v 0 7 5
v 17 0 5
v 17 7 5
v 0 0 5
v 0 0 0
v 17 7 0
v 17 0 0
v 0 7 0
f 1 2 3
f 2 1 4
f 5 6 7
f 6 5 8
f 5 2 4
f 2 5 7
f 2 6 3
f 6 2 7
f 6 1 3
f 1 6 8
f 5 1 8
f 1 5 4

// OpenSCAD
// Generated by SolidPython 1.0.1 on 2020-07-29 00:46:56


cube(size = [17, 7, 5]);
/***********************************************
*********      SolidPython code:      **********
************************************************
 
# import packages: SolidPython
from solid import *
from solid.utils import *
from itertools import chain, combinations, permutations


class Resize:

    def __init__(self, scad_file):
        self.scad_file = scad_file
        #self.scad_file = import_scad(scad_file)
        # cone/cylinder param:
        self.r1 = 0
        self.r2 = 0
        self.h = 0
        # rectangular prism param:
        self.w = 0
        self.l = 0
        # ellipse param:
        self.r = 0

    # import OpenScad code (file name corresponds to shape)


    # classify shape + parameters
    def assign(self, param1, param2, param3):
        if self.scad_file == 'cone.scad':
            self.r1 = param1
            self.r2 = param2
            self.h = param3
        elif self.scad_file == 'cylinder.scad':
            self.r1 = param1
            self.r2 = param2
            self.h = param3
        elif self.scad_file == 'rectangularPrism.scad':
            self.h = param1
            self.l = param2
            self.w = param3
        else:
            self.r = param1
            self.h = param2

    # resize parameters
    def iterate(self):
        x = range(3, 20, 2)
        i = 1
        if self.scad_file == 'cone.scad':
            tempList = list(permutations(x, 2))
            for temp in tempList:
                param1 = temp[0]
                param2 = temp[1]
                filepath = 'produced_scad_files/' + 'cone' + str(param1) + '_' + str(param2) + '_' + '.scad'
                scad_render_to_file(cylinder(h=param1, r1=param2, r2=0), filepath)

        elif self.scad_file == 'cylinder.scad':
            tempList = list(permutations(x, 3))
            for temp in tempList:
                param1 = temp[0]
                param2 = temp[1]
                filepath = 'produced_scad_files/' + 'cylinder' + str(param1) + '_' + str(param2) + '_' + '.scad'
                scad_render_to_file(cylinder(h=param1, r1=param2, r2=param2), filepath)

        elif self.scad_file == 'rectangularPrism.scad':
            tempList = list(permutations(x, 3))
            for temp in tempList:
                param1 = temp[0]
                param2 = temp[1]
                param3 = temp[2]
                filepath = 'produced_scad_files/' + 'rectangularPrism' + str(param1) + '_' + str(param2) + '_' + str(
                    param3) + '.scad'
                scad_render_to_file(cube(size=(param1, param2, param3)), filepath)

        elif self.scad_file == 'ellipse.scad':
            tempList = list(permutations(x, 4))
            for temp in tempList:
                param1 = temp[0]
                param2 = temp[1]
                param3 = temp[2]
                param4 = temp[3]
                filepath = 'produced_scad_files/' + 'ellipse' + str(param1) + '_' + str(param2) + '_' + str(param3) + '_' + str(param4) + '.scad'
                scad_render_to_file(scale([param1, param2, param3])(sphere(r=param4)), filepath)

    def render_to_scadfile(self):
        scad_render_to_file(scad, 'example.scad') 
 
************************************************/
